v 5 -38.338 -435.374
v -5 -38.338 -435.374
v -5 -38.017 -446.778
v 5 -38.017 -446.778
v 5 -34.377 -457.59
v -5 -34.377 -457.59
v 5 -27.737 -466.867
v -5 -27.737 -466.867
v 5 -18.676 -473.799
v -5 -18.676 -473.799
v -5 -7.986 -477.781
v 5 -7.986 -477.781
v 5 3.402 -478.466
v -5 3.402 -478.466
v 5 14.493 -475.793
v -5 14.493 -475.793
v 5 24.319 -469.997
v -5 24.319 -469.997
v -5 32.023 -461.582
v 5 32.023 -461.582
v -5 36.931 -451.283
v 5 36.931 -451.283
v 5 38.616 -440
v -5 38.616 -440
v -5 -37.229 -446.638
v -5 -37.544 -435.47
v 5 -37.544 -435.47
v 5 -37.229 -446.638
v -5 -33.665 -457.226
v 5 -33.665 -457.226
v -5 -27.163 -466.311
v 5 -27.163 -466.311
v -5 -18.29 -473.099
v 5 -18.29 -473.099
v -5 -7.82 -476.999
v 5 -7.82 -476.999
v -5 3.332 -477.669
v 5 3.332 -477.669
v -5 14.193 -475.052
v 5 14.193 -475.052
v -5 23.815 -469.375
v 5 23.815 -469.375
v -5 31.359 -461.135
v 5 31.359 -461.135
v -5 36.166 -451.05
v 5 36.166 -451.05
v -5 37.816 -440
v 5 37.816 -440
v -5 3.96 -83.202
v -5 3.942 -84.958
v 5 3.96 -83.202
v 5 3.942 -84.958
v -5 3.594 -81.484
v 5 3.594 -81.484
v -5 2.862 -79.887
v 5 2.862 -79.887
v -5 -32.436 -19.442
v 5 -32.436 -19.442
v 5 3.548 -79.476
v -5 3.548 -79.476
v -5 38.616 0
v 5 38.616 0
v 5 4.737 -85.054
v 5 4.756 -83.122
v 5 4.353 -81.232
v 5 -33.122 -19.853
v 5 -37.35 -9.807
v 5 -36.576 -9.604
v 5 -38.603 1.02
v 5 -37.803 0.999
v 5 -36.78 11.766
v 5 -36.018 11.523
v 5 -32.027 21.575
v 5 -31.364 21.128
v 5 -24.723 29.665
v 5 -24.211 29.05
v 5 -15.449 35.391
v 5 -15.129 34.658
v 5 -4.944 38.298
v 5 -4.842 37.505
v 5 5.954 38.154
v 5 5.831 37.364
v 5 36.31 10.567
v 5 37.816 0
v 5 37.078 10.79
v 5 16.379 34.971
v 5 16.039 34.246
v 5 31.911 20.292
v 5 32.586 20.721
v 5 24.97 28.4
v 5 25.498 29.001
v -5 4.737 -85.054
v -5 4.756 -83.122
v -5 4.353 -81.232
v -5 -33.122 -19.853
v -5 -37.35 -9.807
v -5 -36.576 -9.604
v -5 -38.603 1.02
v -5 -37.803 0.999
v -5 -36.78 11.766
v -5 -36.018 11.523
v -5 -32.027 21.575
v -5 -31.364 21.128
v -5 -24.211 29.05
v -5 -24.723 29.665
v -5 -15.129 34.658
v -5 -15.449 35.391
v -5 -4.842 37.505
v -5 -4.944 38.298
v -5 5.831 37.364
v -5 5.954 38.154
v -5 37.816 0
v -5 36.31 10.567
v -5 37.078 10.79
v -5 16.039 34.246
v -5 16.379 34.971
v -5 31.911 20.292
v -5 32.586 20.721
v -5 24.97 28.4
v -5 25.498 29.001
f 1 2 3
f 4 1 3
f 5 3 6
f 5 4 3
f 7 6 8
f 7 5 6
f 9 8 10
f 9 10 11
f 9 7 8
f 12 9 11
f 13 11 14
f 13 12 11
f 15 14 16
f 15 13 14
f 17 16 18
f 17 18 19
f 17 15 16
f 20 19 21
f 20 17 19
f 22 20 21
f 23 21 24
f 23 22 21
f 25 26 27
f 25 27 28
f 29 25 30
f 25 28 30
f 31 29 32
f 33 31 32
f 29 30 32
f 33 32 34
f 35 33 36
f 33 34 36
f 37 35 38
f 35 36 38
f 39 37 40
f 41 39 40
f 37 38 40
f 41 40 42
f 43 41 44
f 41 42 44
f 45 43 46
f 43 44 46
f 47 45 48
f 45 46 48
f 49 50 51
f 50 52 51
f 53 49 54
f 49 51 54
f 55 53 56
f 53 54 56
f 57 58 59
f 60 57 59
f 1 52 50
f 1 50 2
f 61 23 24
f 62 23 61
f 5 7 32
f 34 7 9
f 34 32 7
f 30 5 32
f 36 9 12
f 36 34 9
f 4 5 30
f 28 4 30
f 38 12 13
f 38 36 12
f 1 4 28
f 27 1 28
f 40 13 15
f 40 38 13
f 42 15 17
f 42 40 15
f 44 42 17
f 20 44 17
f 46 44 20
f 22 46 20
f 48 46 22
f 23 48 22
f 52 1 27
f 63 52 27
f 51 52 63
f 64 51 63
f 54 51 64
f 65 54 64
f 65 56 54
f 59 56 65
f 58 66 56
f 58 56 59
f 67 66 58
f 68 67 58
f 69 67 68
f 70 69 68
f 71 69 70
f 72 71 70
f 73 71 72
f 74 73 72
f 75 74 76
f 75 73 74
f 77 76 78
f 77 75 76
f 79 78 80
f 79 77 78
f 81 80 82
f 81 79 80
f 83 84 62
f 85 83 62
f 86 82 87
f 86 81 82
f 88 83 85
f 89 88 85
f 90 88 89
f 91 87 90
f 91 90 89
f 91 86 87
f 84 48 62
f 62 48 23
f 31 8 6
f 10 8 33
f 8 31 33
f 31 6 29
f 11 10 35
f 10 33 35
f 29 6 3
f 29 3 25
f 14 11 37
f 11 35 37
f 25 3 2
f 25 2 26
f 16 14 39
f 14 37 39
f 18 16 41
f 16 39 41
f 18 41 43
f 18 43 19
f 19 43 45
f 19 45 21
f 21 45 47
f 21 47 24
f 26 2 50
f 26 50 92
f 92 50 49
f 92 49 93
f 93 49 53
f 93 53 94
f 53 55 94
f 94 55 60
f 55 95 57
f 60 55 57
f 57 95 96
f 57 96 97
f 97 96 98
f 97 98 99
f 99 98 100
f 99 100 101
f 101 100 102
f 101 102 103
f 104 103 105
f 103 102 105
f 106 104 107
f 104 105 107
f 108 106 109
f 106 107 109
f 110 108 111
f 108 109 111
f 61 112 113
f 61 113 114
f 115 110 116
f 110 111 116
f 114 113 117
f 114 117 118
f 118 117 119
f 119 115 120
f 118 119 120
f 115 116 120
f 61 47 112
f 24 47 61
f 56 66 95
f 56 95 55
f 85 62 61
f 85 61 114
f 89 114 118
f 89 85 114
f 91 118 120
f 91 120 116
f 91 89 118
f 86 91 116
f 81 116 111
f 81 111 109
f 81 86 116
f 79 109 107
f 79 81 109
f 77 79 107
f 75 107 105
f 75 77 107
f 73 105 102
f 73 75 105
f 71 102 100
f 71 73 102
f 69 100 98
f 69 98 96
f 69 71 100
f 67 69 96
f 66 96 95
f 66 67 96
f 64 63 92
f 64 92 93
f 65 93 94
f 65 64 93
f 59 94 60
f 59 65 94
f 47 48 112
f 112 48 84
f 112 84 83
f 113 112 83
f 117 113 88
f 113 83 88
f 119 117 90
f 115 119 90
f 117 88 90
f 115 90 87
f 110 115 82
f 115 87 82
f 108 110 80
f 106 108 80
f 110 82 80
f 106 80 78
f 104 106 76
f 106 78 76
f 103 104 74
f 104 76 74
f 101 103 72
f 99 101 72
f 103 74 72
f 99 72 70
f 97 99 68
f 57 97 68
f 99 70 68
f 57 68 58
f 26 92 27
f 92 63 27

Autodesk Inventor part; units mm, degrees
ref_plane "YZ Plane" through (0, 0, 0) normal (1, 0, 0) x (0, 1, 0)
ref_plane "XZ Plane" through (0, 0, 0) normal (0, 1, 0) x (-1, 0, 0)
ref_plane "XY Plane" through (0, 0, 0) normal (0, 0, 1) x (1, 0, 0)
sketch "スケッチ1" plane through (0, 0, 0) normal (1, 0, 0) x (0, 1, 0)
  arc A0 (38.1972, 0) -> (-32.7626, -19.6376) centre (0, 0) ccw
  arc A1 (-37.9221, -435.4244) -> (38.1972, -440) centre (0, -440) ccw
  arc A2 (4.3584, -85.0085) -> (3.2212, -79.6717) centre (-4, -84) ccw
  line L0 (3.2212, -79.6717) -> (-32.7626, -19.6376)
  line L1 (38.1972, -440) -> (38.1972, 0)
  line L2 (4.3584, -85.0085) -> (-37.9221, -435.4244)
  arc A3 (38.6162, 0) -> (-33.122, -19.853) centre (0, 0) ccw
  line L3 (-33.122, -19.853) -> (2.8618, -79.8871)
  arc A4 (3.9424, -84.9583) -> (2.8618, -79.8871) centre (-4, -84) ccw
  line L4 (3.9424, -84.9583) -> (-38.3381, -435.3742)
  arc A5 (-38.3381, -435.3742) -> (38.6162, -440) centre (0, -440) ccw
  line L5 (38.6162, -440) -> (38.6162, 0)
  arc A6 (37.8162, 0) -> (-32.4358, -19.4417) centre (0, 0) ccw
  line L6 (-32.4358, -19.4417) -> (3.548, -79.4758)
  arc A7 (4.7366, -85.0541) -> (3.548, -79.4758) centre (-4, -84) ccw
  line L7 (4.7366, -85.0541) -> (-37.5439, -435.47)
  arc A8 (-37.5439, -435.47) -> (37.8162, -440) centre (0, -440) ccw
  line L8 (37.8162, -440) -> (37.8162, 0)
  dimension "d0" = 76.3944
  dimension "d1" = 76.3944
  dimension "d2" = 440
  dimension "d24" = 0.419
  dimension "d25" = 8
  dimension "d26" = 84
  dimension "d27" = 0.8
  dimension "d30" = 4
extrude "押し出し1" add sketch "スケッチ1" along normal mid plane 10 contours L1 A1 L2 A2 L0 A0 | L5 A5 L4 A4 L3 A3
properties part number "belt_1" material "ゴム"
